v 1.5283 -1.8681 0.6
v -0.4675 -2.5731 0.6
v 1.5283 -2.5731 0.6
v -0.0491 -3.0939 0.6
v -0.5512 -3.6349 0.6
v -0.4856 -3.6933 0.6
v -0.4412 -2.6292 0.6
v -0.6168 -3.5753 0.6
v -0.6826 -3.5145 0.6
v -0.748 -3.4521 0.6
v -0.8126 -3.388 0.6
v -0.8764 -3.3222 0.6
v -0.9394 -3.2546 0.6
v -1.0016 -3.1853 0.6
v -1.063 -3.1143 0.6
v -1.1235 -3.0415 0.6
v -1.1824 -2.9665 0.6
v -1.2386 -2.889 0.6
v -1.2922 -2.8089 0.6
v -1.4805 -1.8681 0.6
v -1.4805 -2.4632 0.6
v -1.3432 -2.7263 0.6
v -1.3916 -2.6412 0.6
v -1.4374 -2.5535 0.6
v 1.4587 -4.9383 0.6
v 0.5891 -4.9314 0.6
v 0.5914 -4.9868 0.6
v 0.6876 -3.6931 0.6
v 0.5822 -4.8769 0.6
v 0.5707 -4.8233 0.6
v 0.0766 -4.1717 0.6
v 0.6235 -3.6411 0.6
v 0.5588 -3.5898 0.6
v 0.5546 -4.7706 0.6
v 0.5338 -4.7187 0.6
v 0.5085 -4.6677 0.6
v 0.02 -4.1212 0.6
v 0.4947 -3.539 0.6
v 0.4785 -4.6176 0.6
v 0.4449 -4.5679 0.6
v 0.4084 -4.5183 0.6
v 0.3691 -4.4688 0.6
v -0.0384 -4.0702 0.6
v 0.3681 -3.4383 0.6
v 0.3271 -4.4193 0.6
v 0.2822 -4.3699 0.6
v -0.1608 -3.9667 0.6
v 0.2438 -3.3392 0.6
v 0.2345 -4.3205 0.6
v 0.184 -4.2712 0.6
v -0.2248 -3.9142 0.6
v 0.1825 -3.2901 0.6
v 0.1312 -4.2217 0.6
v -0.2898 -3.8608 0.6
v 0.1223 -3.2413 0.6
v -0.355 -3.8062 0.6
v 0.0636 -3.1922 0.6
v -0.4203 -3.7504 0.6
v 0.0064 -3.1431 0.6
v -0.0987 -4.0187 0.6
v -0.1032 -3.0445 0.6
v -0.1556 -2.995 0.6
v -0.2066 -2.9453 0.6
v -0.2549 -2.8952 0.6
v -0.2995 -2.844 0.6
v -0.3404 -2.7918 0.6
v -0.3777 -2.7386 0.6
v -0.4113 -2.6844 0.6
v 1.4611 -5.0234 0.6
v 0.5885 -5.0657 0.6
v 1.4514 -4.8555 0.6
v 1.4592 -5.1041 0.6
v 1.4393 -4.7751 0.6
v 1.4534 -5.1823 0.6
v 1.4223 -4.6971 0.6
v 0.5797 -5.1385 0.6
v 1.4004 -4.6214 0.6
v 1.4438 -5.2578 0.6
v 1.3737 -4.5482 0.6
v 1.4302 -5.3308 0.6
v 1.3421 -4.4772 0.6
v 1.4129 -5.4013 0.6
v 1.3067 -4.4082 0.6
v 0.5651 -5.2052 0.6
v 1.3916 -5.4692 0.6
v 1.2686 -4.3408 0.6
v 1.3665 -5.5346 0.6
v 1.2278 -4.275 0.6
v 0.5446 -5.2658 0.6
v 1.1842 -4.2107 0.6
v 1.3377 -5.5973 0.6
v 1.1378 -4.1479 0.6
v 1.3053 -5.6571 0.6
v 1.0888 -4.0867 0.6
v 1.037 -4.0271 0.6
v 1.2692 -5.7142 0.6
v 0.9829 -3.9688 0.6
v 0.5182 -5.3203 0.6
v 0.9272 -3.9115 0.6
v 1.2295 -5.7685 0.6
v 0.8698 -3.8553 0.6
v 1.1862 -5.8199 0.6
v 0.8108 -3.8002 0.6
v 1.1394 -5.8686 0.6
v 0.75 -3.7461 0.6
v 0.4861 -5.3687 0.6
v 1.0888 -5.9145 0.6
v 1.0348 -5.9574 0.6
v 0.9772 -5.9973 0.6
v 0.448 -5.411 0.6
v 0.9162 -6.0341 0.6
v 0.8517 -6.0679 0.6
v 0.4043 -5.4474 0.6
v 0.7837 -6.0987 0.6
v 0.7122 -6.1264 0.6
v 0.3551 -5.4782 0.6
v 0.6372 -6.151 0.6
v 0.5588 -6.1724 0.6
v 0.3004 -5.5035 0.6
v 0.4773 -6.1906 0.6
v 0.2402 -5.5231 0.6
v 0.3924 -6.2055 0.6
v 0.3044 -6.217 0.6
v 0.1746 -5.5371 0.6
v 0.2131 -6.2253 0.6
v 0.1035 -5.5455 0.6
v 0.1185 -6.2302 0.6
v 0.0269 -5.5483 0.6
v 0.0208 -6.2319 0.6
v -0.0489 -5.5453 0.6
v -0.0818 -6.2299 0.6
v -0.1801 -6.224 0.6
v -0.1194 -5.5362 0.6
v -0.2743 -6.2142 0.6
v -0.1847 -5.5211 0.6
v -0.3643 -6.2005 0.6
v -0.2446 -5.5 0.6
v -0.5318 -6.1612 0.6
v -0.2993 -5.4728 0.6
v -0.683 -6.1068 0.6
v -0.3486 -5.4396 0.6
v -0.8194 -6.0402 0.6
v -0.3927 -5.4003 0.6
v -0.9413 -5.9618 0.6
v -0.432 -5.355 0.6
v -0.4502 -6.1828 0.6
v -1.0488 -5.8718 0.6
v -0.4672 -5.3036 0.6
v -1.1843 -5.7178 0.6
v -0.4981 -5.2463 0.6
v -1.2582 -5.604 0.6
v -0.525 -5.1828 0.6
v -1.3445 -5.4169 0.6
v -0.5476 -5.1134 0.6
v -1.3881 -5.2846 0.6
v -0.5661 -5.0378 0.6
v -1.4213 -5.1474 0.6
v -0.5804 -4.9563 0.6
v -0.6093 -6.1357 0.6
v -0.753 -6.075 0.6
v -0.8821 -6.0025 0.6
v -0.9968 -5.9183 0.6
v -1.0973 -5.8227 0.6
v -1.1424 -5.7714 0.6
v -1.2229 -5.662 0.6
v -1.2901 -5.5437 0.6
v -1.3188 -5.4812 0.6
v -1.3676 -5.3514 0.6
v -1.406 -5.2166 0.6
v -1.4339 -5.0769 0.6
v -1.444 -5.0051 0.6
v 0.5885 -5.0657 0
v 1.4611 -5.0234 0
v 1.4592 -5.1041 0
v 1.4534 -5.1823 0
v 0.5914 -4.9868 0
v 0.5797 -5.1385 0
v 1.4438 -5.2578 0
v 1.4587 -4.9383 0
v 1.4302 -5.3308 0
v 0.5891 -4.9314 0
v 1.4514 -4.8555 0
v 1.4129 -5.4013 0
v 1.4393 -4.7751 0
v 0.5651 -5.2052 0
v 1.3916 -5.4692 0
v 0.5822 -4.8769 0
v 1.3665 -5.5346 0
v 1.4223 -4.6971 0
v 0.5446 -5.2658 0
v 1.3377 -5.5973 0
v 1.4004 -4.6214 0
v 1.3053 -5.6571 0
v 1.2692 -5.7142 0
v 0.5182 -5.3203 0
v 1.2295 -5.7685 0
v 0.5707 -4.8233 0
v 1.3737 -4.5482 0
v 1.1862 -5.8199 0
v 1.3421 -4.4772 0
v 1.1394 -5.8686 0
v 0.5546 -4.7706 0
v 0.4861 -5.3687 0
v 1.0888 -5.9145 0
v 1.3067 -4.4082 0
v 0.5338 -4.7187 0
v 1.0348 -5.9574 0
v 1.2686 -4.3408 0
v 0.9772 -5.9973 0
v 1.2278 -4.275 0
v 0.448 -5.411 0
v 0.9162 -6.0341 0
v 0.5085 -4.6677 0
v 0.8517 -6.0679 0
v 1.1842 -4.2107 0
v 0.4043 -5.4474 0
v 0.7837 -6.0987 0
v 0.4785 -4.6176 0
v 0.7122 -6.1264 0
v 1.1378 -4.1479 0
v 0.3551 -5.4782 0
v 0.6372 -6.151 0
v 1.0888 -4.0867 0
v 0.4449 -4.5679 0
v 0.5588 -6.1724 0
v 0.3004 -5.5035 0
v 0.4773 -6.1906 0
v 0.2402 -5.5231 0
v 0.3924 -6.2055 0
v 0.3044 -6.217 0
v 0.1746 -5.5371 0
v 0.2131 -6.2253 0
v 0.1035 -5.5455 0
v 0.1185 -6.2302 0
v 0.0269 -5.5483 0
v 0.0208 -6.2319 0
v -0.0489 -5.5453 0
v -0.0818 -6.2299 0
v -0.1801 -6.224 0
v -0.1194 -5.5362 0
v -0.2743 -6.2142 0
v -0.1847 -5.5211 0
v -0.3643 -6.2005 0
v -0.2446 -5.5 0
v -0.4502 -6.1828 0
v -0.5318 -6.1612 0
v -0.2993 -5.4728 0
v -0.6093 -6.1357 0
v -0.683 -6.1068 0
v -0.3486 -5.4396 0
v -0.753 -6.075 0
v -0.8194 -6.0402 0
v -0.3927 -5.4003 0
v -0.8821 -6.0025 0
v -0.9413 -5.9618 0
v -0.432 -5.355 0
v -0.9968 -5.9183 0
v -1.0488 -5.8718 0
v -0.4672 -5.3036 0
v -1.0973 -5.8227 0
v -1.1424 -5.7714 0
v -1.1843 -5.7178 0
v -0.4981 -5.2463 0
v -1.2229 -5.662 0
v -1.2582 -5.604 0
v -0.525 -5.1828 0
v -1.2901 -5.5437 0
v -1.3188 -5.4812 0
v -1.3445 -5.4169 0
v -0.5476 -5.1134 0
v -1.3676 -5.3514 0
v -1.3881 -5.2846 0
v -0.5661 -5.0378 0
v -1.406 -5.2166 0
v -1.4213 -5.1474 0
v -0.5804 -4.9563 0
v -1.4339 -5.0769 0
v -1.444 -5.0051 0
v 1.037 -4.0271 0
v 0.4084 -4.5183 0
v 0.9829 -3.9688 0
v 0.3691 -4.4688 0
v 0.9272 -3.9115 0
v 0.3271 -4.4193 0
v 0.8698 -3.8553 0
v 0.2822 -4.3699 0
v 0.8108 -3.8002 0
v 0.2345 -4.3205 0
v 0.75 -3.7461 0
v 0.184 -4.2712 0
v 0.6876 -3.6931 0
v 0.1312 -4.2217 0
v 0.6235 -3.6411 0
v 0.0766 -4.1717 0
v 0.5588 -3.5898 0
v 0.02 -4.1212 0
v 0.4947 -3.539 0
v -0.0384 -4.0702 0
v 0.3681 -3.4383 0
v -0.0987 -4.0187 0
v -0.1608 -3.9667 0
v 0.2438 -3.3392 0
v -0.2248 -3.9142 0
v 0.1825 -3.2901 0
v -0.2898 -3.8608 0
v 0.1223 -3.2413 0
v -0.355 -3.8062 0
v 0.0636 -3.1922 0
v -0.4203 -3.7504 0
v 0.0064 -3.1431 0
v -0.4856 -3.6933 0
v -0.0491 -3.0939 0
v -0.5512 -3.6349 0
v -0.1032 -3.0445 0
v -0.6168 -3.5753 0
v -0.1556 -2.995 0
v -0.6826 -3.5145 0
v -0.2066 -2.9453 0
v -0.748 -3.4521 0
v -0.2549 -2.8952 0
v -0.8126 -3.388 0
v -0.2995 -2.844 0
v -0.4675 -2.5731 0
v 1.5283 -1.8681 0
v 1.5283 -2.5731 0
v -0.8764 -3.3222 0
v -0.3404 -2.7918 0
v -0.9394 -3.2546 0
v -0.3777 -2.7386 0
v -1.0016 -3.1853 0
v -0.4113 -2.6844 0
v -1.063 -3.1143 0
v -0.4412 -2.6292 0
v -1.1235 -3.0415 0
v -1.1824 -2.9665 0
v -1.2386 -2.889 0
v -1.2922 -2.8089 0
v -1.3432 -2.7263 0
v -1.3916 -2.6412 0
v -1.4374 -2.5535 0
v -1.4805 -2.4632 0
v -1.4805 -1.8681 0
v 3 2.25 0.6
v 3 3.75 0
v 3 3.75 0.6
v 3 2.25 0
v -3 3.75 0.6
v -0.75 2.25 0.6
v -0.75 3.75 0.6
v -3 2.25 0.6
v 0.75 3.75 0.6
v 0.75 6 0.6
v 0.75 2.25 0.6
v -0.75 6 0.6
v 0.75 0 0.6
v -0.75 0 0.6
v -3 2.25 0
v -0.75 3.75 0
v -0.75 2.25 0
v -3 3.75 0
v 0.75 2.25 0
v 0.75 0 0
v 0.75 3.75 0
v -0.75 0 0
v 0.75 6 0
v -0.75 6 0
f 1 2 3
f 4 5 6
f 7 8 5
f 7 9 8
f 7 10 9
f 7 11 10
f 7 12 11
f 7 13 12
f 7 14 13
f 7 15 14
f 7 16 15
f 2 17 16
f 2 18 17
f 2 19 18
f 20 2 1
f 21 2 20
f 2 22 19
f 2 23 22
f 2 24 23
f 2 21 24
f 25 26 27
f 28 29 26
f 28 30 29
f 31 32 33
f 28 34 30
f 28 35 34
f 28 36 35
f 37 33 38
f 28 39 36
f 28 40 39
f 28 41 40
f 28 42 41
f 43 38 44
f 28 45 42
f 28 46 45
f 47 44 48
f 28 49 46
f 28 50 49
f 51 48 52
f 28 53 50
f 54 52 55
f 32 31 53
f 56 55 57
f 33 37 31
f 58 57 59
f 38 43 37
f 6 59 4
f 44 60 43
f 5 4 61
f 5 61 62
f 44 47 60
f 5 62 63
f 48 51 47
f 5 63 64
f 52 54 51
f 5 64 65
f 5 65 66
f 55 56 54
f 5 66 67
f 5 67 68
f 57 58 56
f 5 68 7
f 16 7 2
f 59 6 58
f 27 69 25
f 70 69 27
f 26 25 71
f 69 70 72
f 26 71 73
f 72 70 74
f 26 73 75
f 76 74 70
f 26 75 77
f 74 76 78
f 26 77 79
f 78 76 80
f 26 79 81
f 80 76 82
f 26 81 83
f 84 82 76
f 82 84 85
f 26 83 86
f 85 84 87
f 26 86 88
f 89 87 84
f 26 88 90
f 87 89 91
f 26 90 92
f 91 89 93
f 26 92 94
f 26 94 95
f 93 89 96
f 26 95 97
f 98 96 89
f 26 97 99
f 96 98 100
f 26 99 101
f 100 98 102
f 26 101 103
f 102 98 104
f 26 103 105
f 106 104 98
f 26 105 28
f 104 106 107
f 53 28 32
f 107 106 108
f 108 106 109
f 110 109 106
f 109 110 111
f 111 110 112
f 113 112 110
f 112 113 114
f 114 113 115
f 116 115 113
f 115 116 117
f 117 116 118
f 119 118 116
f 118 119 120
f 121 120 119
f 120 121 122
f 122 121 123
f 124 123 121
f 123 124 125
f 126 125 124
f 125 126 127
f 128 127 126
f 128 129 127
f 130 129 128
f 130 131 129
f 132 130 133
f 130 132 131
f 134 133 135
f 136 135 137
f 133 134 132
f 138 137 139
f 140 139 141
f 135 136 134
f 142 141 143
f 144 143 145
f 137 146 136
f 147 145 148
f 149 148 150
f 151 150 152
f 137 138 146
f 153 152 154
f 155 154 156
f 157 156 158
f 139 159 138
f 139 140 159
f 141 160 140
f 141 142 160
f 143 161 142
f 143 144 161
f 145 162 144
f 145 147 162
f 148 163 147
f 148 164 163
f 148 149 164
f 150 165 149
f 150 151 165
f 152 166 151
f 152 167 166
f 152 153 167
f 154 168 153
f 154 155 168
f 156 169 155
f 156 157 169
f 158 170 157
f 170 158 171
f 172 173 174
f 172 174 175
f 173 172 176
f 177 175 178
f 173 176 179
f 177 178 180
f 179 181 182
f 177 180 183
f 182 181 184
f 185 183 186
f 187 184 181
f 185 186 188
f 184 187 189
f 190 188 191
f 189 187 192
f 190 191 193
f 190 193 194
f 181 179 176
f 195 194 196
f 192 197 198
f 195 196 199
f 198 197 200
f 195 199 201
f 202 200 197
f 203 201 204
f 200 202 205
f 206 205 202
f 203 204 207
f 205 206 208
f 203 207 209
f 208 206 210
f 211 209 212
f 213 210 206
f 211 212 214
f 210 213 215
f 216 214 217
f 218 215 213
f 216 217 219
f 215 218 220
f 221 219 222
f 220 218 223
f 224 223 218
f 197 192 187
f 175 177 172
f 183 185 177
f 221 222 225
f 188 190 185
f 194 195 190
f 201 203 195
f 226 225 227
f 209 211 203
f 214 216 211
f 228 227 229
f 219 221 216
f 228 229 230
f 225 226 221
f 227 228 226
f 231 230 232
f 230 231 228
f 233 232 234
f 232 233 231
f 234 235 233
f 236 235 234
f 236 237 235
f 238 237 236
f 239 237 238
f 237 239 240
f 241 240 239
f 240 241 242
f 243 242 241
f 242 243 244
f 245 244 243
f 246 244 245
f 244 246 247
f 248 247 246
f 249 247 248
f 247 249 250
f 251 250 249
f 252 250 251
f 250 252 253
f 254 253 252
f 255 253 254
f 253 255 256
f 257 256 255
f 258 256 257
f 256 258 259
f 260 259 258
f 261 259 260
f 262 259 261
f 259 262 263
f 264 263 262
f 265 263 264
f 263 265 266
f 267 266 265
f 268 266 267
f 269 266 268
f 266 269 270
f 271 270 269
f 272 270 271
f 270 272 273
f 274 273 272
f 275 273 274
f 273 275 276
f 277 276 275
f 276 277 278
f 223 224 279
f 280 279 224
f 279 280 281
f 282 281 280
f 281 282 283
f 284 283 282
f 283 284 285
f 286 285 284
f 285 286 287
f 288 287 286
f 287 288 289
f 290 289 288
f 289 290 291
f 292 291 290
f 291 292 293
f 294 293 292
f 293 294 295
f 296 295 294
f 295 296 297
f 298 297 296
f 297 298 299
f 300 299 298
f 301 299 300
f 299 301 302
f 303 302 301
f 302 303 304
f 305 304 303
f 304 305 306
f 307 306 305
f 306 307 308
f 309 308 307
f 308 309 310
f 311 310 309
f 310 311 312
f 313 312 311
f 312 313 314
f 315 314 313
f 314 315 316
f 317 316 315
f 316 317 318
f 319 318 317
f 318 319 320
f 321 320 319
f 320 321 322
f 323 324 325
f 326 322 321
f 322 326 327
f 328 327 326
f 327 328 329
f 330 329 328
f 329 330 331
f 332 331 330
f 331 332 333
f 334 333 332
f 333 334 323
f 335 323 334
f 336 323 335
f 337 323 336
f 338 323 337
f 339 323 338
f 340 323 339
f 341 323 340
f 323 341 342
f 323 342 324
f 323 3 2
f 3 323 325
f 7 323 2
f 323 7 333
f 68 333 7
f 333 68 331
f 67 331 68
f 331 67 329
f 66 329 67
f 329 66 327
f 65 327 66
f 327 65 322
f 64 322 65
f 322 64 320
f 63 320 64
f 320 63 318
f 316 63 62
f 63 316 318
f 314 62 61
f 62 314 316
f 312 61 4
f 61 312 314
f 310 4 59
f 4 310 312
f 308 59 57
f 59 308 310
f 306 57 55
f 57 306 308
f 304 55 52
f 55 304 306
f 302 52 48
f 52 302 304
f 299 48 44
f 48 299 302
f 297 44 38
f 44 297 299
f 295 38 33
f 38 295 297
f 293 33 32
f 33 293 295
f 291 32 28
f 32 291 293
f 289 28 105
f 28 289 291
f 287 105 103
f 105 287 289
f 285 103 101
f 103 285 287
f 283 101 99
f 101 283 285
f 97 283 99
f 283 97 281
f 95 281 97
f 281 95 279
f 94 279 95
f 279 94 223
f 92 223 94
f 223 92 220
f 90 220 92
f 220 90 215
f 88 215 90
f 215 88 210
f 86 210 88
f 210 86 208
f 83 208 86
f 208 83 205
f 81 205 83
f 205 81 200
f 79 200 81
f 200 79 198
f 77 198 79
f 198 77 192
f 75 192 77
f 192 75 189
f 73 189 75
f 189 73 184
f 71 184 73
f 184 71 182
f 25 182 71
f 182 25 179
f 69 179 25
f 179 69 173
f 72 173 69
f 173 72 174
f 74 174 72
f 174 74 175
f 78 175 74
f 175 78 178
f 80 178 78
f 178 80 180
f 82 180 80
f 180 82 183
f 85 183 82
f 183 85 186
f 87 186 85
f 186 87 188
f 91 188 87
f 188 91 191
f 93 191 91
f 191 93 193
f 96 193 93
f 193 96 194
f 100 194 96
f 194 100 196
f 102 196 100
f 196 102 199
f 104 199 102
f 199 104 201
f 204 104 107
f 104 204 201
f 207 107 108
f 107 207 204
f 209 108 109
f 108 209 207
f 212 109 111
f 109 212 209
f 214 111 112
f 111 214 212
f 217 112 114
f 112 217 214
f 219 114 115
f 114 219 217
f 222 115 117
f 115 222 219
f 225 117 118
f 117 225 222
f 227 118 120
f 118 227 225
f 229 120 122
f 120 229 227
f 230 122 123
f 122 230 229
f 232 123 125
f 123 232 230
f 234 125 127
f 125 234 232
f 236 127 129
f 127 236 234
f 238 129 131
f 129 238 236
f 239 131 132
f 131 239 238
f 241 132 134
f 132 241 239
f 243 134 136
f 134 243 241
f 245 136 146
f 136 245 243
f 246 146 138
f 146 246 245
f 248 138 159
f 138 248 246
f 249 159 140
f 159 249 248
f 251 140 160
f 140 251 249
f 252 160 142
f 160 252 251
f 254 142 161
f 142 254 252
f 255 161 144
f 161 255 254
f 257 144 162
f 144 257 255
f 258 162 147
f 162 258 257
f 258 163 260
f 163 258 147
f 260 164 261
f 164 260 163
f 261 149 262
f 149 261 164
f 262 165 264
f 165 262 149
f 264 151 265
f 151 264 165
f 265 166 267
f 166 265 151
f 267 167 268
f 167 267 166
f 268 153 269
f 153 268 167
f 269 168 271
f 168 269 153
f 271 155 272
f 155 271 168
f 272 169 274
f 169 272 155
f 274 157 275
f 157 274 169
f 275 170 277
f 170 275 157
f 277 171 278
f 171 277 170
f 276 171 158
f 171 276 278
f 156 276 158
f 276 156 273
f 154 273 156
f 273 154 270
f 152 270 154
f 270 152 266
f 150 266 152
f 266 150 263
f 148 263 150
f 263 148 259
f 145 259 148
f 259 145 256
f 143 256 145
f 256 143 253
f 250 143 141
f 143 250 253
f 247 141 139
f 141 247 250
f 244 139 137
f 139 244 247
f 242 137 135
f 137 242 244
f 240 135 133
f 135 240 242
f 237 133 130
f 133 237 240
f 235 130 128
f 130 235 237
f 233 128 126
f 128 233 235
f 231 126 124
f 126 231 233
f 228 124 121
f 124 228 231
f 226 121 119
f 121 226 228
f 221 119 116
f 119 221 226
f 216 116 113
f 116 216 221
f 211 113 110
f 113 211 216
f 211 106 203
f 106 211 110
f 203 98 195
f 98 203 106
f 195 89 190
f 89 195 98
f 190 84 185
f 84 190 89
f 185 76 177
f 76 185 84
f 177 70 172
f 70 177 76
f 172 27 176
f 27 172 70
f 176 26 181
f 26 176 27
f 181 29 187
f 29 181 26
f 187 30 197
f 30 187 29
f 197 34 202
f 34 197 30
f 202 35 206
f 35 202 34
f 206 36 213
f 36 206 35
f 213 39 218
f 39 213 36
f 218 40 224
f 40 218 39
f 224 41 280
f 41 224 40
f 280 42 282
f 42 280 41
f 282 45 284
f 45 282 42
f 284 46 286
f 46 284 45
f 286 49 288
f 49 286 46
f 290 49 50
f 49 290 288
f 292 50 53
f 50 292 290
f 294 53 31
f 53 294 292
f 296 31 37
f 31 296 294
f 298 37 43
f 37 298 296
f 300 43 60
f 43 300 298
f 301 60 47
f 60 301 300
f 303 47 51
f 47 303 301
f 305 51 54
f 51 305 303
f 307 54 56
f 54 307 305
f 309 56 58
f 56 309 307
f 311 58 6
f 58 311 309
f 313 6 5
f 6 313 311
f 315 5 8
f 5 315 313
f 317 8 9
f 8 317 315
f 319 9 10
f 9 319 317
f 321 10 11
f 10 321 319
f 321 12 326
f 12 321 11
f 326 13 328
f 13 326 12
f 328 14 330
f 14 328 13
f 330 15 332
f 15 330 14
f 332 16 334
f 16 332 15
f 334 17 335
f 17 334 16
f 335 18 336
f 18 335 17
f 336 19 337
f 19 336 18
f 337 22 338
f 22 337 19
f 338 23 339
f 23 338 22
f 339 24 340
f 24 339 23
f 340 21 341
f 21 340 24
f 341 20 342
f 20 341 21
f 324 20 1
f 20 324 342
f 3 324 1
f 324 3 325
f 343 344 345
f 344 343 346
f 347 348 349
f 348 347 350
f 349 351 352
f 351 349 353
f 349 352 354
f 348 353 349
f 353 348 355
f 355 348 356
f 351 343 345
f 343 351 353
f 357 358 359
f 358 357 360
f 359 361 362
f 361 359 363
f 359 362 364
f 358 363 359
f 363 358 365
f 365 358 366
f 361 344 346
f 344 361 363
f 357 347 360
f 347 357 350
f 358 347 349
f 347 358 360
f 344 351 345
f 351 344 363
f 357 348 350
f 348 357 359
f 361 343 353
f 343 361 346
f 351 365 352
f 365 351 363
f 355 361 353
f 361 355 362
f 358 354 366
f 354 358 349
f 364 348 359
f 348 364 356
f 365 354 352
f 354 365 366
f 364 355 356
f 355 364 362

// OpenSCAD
$fn = 50;

difference() {
	union() {
		translate(v = [0.0, -4.0, 0.6]) {
			rotate(a = [180, 0, 0]) {
				linear_extrude(height = 0.6) {
					text(font = "Liberation Sans:style=Bold", halign = "center", size = 4.5, text = "2", valign = "center");
				}
			}
		}
		translate(v = [-3.0, 2.25, 0]) {
			cube(size = [6, 1.5, 0.6]);
		}
		translate(v = [-0.75, 0.0, 0]) {
			cube(size = [1.5, 6, 0.6]);
		}
	}
	union();
}
